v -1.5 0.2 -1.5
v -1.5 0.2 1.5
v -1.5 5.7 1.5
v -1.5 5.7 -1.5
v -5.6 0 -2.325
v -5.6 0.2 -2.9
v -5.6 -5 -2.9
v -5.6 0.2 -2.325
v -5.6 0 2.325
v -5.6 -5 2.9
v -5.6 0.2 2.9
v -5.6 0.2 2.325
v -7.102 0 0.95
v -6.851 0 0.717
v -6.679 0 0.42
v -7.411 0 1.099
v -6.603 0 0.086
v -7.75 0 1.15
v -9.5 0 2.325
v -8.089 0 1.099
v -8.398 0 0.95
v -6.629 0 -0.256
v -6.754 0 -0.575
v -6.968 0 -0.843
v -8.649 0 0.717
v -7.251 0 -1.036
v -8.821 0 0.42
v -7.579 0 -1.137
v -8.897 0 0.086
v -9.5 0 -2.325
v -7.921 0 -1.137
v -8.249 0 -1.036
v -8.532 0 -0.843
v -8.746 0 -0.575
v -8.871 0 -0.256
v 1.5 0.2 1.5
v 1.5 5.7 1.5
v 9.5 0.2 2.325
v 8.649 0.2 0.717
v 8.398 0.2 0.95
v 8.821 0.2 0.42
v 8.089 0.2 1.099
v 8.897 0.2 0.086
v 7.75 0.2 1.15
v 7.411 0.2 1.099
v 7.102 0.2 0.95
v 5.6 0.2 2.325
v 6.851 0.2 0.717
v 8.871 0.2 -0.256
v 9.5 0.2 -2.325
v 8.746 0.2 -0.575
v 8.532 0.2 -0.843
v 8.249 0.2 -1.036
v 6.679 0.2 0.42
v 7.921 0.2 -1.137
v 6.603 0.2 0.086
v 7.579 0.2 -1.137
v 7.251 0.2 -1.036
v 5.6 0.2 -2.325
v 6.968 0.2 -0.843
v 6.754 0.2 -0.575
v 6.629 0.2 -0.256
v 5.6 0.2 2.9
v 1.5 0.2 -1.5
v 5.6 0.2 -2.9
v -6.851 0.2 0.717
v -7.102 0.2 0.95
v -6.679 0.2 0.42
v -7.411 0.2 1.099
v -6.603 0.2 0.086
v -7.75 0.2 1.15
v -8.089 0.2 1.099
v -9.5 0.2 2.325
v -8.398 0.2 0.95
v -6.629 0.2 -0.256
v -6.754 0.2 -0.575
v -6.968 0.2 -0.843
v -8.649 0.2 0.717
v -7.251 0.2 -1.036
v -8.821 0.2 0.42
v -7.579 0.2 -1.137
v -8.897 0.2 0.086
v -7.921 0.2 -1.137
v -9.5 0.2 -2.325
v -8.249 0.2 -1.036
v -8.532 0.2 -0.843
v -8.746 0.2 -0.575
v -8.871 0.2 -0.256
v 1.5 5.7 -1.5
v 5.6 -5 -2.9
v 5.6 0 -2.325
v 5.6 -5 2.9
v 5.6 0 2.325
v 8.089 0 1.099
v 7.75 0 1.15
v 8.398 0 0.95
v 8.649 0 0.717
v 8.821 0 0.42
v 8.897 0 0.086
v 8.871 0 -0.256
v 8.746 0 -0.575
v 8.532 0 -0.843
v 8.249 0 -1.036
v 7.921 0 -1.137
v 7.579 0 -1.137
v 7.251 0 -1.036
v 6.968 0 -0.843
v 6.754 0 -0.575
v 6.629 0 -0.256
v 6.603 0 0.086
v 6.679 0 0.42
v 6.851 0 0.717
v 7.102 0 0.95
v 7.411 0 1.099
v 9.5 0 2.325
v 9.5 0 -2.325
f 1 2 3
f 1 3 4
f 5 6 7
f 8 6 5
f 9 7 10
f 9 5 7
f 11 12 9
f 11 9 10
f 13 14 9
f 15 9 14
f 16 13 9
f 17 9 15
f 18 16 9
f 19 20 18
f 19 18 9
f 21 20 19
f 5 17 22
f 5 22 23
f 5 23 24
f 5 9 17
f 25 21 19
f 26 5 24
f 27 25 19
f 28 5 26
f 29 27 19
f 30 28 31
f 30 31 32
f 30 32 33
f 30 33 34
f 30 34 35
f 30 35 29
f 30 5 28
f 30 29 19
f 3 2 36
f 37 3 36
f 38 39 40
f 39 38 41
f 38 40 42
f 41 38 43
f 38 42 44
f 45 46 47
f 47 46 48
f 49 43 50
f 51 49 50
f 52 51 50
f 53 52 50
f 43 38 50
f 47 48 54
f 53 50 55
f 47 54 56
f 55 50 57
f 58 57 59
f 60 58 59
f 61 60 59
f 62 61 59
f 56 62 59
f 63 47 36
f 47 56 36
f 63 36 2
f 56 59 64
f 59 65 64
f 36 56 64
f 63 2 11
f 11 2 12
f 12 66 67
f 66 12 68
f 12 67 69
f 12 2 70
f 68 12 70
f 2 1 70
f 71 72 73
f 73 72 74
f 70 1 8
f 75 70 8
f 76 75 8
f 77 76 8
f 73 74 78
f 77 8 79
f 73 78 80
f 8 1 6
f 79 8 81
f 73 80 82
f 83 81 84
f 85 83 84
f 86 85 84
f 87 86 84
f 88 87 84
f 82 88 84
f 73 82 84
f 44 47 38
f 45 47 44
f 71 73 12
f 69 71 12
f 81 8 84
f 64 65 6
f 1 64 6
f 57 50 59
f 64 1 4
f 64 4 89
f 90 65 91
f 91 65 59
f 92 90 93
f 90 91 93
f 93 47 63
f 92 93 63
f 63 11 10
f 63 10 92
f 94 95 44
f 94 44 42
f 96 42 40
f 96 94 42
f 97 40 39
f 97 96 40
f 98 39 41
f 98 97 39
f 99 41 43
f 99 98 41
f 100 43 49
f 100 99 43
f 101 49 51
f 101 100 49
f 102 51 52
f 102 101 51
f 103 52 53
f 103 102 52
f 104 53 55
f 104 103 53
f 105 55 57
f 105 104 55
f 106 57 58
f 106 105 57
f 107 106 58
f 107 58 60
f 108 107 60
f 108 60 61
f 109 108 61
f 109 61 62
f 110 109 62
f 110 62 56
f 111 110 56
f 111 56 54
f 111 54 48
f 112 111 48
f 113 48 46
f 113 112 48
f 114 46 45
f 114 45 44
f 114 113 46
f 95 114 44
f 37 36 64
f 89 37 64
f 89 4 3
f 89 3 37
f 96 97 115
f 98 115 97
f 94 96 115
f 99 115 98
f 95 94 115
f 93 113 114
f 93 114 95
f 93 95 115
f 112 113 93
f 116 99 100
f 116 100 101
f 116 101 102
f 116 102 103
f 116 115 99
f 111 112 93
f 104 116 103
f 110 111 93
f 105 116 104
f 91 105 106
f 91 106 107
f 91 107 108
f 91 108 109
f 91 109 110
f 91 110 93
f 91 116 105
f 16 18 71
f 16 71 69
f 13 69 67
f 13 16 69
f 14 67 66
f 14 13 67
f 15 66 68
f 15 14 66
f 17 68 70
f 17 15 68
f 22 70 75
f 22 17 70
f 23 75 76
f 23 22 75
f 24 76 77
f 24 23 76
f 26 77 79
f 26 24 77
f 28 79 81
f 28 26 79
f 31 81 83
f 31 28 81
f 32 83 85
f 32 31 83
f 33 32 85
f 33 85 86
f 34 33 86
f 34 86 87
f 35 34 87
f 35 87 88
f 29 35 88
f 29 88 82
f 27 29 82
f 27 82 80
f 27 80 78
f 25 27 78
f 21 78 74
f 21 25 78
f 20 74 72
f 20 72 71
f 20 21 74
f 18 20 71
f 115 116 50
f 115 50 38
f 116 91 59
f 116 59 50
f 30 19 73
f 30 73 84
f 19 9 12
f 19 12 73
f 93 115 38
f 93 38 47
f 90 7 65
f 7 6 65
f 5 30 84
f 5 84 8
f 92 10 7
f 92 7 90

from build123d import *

# Parameters (mm, degrees)
SKETCH1_R           = 1.15
BOSS_EXTRUDE1_DEPTH = 0.2
SKETCH2_W           = 11.2
SKETCH2_H           = 5.8
BOSS_EXTRUDE2_DEPTH = 5
SKETCH3_W           = 3
SKETCH3_H           = 3
BOSS_EXTRUDE3_DEPTH = 5.5


with BuildPart() as part:
    # Sketch1 → Boss-Extrude1 (new body)
    with BuildSketch(Plane(origin=(0, 0, 0), x_dir=(1, 0, 0), z_dir=(0, 1, 0))):
        Polygon((9.5, 2.325), (9.5, -2.325), (5.6, -2.325), (5.6, -2.9), (-5.6, -2.9), (-5.6, -2.325), (-9.5, -2.325), (-9.5, 2.325), (-5.6, 2.325), (-5.6, 2.9), (5.6, 2.9), (5.6, 2.325), align=None)
        with Locations(Location((-7.75, 0, 0), (0, 0, 270))):
            Circle(SKETCH1_R, mode=Mode.SUBTRACT)
        with Locations(Location((7.75, 0, 0), (0, 0, 270))):
            Circle(SKETCH1_R, mode=Mode.SUBTRACT)
    extrude(amount=BOSS_EXTRUDE1_DEPTH)

    # Sketch2 → Boss-Extrude2 (add)
    with BuildSketch(Plane.XZ):
        Rectangle(SKETCH2_W, SKETCH2_H)
    extrude(amount=BOSS_EXTRUDE2_DEPTH)

    # Sketch3 → Boss-Extrude3 (add)
    with BuildSketch(Plane(origin=(0, 0.2, 0), x_dir=(1, 0, 0), z_dir=(0, 1, 0))):
        Rectangle(SKETCH3_W, SKETCH3_H)
    extrude(amount=BOSS_EXTRUDE3_DEPTH)


solid = part.part
